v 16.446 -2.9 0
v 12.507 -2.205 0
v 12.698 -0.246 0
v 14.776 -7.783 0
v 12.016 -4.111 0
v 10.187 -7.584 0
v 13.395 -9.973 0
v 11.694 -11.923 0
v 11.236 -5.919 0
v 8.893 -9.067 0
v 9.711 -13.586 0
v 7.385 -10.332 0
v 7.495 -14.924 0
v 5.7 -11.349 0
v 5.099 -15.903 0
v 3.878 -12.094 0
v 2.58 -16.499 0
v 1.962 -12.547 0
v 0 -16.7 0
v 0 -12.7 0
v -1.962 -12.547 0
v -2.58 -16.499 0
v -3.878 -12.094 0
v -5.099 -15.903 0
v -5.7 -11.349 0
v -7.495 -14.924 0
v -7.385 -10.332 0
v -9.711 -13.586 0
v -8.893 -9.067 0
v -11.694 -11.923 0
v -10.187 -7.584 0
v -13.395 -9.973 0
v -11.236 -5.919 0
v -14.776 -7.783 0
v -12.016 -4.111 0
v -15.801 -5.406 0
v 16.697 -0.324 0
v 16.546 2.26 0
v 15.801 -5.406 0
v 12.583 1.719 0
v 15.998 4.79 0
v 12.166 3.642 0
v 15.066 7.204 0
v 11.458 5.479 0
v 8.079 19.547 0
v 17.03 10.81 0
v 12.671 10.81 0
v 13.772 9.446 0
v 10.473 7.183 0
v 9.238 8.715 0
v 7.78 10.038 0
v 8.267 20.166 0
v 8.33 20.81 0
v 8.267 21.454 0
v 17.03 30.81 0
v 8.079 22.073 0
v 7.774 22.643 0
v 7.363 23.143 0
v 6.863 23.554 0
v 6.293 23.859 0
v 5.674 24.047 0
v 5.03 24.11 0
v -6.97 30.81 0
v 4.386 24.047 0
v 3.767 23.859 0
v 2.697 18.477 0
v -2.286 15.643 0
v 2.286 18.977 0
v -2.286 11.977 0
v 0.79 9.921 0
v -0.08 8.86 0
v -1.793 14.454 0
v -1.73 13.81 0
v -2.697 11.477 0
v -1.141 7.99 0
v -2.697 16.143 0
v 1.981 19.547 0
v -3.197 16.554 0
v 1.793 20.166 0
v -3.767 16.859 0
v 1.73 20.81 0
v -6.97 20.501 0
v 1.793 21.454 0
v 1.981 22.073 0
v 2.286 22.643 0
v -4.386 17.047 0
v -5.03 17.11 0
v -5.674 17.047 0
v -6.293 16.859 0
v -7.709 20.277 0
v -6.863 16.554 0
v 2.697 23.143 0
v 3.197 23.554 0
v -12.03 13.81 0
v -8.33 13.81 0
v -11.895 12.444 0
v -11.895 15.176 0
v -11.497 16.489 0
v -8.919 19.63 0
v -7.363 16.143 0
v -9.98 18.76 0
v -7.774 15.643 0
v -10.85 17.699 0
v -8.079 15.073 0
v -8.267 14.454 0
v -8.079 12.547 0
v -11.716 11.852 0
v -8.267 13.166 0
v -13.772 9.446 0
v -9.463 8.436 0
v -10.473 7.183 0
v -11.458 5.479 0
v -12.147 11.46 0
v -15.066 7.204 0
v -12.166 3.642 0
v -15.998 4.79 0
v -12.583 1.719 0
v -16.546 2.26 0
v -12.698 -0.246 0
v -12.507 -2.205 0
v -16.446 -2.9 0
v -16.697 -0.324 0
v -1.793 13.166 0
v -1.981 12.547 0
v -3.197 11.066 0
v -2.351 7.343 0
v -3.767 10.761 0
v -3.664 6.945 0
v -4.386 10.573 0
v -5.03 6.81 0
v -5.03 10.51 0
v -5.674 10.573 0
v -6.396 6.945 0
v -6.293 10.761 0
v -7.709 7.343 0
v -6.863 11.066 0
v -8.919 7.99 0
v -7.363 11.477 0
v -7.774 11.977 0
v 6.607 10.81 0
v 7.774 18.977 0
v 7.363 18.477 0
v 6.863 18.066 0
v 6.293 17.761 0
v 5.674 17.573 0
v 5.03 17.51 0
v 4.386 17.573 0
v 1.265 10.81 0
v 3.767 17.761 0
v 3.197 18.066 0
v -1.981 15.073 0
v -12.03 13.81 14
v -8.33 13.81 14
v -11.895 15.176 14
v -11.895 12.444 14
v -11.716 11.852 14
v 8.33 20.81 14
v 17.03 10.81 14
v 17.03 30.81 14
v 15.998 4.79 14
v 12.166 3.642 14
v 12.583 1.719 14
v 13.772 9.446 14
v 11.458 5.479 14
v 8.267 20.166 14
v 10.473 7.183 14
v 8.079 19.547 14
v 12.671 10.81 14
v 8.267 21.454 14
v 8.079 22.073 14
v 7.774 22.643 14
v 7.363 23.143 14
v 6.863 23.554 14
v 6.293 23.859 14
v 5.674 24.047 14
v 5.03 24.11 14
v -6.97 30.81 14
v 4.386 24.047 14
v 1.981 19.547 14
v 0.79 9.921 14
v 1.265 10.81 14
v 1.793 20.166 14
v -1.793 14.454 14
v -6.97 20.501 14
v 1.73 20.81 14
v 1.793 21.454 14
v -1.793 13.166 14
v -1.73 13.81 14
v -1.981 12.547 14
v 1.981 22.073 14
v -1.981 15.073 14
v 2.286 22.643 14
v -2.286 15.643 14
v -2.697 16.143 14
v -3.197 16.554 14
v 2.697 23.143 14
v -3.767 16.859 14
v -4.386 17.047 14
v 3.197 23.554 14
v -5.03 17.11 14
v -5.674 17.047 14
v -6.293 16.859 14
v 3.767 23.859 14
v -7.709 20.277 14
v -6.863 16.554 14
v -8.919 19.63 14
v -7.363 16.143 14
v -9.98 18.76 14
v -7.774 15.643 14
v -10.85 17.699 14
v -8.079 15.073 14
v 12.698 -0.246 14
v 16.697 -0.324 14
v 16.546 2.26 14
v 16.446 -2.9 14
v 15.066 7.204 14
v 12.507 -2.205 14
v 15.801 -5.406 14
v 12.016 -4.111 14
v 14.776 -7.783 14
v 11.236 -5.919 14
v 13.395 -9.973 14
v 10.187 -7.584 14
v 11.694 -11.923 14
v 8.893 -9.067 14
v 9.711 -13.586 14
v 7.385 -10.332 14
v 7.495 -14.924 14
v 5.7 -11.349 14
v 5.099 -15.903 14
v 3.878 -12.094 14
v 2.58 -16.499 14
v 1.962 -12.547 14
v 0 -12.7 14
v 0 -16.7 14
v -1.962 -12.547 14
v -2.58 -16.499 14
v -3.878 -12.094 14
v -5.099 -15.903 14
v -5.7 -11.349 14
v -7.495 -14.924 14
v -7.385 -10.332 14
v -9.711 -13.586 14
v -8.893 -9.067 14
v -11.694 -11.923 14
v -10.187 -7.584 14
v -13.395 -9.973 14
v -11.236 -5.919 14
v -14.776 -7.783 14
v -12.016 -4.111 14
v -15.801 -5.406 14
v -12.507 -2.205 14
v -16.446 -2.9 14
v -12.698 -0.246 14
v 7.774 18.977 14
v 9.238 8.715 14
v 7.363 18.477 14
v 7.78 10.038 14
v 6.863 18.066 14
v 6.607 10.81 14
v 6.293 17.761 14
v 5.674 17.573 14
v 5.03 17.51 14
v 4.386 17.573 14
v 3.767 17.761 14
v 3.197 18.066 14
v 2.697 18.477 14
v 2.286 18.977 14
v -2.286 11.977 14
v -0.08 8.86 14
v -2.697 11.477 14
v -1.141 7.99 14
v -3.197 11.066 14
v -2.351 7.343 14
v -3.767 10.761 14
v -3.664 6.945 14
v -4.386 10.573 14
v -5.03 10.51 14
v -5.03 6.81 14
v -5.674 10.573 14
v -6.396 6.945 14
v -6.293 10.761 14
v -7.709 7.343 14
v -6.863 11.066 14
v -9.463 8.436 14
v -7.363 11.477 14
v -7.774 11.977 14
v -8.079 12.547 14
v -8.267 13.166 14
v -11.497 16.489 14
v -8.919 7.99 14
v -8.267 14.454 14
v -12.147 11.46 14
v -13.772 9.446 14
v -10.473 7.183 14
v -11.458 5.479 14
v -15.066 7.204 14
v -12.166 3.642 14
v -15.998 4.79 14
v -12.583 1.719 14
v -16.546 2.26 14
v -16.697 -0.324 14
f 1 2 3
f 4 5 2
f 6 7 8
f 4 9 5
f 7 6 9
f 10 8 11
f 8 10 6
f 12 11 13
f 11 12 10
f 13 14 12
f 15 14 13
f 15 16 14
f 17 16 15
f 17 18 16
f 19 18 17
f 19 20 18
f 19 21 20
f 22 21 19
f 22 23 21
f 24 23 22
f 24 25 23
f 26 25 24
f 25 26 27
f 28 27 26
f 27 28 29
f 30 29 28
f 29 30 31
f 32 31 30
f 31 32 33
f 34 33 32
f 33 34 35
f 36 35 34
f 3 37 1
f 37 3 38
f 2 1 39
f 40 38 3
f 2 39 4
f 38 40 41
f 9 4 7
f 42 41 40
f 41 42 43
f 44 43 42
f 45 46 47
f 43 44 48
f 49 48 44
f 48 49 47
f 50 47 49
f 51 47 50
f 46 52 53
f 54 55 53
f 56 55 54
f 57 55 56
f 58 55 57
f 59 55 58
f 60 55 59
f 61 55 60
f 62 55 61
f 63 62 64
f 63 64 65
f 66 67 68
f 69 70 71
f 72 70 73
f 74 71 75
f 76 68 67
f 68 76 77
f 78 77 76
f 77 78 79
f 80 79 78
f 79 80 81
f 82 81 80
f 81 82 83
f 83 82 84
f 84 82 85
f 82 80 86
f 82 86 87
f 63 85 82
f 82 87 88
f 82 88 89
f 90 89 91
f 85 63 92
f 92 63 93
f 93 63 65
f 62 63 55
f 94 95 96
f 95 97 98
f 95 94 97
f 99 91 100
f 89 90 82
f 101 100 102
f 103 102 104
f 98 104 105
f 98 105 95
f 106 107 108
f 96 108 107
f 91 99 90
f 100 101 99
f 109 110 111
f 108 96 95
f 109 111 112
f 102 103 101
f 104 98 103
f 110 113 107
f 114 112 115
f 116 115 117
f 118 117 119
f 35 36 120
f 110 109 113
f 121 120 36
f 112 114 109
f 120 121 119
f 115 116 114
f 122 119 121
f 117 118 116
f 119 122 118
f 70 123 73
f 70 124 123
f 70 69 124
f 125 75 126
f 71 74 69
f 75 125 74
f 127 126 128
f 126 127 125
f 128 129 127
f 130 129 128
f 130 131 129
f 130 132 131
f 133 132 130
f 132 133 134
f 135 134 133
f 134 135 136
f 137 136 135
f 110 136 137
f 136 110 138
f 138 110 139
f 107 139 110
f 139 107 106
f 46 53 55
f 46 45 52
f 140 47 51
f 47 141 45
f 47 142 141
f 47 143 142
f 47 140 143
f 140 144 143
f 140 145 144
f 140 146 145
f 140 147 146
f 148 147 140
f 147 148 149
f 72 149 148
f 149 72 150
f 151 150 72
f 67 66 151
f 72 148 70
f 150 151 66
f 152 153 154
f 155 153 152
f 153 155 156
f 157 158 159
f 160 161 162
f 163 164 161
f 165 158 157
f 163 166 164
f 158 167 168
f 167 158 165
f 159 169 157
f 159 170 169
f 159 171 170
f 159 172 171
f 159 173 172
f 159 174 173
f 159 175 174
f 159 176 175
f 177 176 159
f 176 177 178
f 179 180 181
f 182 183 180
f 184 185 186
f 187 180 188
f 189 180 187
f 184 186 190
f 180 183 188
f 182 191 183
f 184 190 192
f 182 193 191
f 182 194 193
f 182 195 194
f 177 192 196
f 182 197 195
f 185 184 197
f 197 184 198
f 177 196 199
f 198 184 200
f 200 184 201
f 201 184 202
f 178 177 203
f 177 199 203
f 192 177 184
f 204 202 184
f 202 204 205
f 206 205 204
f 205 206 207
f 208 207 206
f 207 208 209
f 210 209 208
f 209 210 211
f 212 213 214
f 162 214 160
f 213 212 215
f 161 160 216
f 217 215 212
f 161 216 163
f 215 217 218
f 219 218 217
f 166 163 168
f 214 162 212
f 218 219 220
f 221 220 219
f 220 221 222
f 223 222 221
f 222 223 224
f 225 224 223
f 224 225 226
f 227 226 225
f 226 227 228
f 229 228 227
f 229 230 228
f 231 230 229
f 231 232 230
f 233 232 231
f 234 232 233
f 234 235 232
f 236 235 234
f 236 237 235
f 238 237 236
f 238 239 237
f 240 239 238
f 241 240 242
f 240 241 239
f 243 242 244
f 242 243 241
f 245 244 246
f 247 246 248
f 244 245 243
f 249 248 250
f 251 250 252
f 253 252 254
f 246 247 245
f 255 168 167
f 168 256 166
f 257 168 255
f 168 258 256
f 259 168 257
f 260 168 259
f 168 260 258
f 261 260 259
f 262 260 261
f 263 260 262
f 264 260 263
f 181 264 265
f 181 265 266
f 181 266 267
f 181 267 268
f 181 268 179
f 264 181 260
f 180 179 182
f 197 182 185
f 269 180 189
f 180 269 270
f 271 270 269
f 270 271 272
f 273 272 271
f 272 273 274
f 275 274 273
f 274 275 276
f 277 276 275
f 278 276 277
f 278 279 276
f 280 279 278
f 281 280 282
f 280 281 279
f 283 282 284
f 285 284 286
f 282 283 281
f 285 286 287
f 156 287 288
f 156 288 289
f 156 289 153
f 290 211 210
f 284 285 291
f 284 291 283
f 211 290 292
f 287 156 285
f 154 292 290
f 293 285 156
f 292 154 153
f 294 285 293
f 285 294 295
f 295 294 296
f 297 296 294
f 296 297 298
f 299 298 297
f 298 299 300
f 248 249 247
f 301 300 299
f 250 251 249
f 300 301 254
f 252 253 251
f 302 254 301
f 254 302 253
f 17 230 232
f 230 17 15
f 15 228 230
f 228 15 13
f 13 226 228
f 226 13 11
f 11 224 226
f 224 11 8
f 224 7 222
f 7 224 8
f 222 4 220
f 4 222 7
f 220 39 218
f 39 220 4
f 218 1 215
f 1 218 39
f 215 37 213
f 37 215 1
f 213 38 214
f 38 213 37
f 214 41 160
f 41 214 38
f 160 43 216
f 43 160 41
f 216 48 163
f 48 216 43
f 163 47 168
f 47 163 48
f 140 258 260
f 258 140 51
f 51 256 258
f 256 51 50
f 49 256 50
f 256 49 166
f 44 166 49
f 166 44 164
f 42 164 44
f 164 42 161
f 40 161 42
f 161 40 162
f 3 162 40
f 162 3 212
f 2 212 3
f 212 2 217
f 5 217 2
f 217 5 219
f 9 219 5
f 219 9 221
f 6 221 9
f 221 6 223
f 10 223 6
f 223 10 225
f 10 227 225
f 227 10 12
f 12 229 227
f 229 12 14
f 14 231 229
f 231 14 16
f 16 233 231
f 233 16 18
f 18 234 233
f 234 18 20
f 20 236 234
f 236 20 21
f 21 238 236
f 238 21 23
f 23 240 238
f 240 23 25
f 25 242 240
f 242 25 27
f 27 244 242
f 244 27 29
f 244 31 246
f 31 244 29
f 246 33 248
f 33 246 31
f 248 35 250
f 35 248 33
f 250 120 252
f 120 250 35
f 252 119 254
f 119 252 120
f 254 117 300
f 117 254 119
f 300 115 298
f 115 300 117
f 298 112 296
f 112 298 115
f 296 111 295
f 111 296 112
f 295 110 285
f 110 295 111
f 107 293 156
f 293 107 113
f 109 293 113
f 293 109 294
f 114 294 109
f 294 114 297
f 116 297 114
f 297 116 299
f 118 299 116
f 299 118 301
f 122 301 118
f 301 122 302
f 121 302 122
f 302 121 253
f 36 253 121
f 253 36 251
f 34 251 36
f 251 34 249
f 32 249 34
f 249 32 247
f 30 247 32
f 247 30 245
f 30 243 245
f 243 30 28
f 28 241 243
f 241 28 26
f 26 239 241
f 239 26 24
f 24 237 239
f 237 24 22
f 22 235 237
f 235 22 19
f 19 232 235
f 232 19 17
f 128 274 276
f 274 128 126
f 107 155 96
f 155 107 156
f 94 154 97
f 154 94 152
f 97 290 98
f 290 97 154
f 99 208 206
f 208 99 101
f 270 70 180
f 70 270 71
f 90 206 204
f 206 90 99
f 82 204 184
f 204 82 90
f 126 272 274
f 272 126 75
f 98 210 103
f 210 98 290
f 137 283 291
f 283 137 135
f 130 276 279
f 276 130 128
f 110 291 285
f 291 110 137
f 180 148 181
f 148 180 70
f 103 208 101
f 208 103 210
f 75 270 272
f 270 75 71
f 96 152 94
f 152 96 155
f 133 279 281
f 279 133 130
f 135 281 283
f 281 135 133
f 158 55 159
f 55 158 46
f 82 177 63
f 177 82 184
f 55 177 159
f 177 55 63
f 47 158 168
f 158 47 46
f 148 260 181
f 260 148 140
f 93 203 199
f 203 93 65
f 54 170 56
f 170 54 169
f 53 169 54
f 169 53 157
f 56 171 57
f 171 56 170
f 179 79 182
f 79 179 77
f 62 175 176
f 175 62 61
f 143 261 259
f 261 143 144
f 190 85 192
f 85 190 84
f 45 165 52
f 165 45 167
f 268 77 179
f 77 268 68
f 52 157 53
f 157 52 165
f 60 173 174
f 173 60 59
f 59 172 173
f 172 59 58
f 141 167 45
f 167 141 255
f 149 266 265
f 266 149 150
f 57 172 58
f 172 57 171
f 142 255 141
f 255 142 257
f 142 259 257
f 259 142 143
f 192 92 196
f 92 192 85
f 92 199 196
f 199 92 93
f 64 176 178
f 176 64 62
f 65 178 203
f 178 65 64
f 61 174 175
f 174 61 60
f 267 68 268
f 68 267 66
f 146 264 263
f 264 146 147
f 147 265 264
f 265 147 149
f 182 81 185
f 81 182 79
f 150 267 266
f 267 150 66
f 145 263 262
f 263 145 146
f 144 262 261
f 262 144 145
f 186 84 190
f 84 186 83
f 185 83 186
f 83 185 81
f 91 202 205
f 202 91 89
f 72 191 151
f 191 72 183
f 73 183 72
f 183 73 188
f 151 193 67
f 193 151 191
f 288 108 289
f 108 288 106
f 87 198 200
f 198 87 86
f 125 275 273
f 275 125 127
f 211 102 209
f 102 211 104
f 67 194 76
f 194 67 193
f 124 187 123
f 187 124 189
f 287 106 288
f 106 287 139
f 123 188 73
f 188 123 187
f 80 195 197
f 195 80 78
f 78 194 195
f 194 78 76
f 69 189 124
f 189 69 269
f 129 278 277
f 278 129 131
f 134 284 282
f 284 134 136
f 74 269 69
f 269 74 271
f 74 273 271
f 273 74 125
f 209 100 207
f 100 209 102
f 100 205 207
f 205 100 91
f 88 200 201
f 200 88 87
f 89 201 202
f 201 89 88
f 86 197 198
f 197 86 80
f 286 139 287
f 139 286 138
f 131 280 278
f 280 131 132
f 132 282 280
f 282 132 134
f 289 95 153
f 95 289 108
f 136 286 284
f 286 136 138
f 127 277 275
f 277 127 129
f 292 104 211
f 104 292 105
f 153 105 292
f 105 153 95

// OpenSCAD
$fn = 32;

// ----------------------------------------------------------------------
// Pipe clamp: 33.4 mm ring, 4 mm wall, 14 mm wide
// ----------------------------------------------------------------------

// --- parameters (mm) ---
outer_r = 16.7;           // clamp outside radius
inner_r = 12.7;           // pipe bore radius
band = 4;                 // band thickness
clamp_w = 14;             // clamp width
opening = 40;             // opening angle between the ends
lug_w = 24;               // lug width
lug_len = 20;             // lug length
bolt_d = 6.6;             // bolt hole
knuckle_d = 14;           // hinge knuckle diameter
pin_d = 6.6;              // hinge pin hole

clamp_profile = [[-5.712, 15.693], [-8.068, 14.622], [-10.23, 13.2], [-12.147, 11.46], [-13.772, 9.446], [-15.066, 7.204], [-15.998, 4.79], [-16.546, 2.26], [-16.697, -0.324], [-16.446, -2.9], [-15.801, -5.406], [-14.776, -7.783], [-13.395, -9.973], [-11.694, -11.923], [-9.711, -13.586], [-7.495, -14.924], [-5.099, -15.903], [-2.58, -16.499], [0, -16.7], [2.58, -16.499], [5.099, -15.903], [7.495, -14.924], [9.711, -13.586], [11.694, -11.923], [13.395, -9.973], [14.776, -7.783], [15.801, -5.406], [16.446, -2.9], [16.697, -0.324], [16.546, 2.26], [15.998, 4.79], [15.066, 7.204], [13.772, 9.446], [12.147, 11.46], [10.23, 13.2], [8.068, 14.622], [5.712, 15.693], [4.344, 11.934], [6.136, 11.12], [7.78, 10.038], [9.238, 8.715], [10.473, 7.183], [11.458, 5.479], [12.166, 3.642], [12.583, 1.719], [12.698, -0.246], [12.507, -2.205], [12.016, -4.111], [11.236, -5.919], [10.187, -7.584], [8.893, -9.067], [7.385, -10.332], [5.7, -11.349], [3.878, -12.094], [1.962, -12.547], [0, -12.7], [-1.962, -12.547], [-3.878, -12.094], [-5.7, -11.349], [-7.385, -10.332], [-8.893, -9.067], [-10.187, -7.584], [-11.236, -5.919], [-12.016, -4.111], [-12.507, -2.205], [-12.698, -0.246], [-12.583, 1.719], [-12.166, 3.642], [-11.458, 5.479], [-10.473, 7.183], [-9.238, 8.715], [-7.78, 10.038], [-6.136, 11.12], [-4.344, 11.934]];

difference() {
  union() {
    linear_extrude(height = clamp_w) polygon(clamp_profile);
    /* hinge knuckle, sunk 2 mm into the band end */
    translate([-5.03, 13.81, 0]) cylinder(h = clamp_w, d = knuckle_d);
    /* bolt lug on the other end */
    translate([-6.97, 10.81, 0]) cube([lug_w, 20, clamp_w]);
  }
  translate([5.03, 20.81, -2.5]) cylinder(h = clamp_w + 5, d = bolt_d);
  translate([-5.03, 13.81, -2.5]) cylinder(h = clamp_w + 5, d = pin_d);
}
